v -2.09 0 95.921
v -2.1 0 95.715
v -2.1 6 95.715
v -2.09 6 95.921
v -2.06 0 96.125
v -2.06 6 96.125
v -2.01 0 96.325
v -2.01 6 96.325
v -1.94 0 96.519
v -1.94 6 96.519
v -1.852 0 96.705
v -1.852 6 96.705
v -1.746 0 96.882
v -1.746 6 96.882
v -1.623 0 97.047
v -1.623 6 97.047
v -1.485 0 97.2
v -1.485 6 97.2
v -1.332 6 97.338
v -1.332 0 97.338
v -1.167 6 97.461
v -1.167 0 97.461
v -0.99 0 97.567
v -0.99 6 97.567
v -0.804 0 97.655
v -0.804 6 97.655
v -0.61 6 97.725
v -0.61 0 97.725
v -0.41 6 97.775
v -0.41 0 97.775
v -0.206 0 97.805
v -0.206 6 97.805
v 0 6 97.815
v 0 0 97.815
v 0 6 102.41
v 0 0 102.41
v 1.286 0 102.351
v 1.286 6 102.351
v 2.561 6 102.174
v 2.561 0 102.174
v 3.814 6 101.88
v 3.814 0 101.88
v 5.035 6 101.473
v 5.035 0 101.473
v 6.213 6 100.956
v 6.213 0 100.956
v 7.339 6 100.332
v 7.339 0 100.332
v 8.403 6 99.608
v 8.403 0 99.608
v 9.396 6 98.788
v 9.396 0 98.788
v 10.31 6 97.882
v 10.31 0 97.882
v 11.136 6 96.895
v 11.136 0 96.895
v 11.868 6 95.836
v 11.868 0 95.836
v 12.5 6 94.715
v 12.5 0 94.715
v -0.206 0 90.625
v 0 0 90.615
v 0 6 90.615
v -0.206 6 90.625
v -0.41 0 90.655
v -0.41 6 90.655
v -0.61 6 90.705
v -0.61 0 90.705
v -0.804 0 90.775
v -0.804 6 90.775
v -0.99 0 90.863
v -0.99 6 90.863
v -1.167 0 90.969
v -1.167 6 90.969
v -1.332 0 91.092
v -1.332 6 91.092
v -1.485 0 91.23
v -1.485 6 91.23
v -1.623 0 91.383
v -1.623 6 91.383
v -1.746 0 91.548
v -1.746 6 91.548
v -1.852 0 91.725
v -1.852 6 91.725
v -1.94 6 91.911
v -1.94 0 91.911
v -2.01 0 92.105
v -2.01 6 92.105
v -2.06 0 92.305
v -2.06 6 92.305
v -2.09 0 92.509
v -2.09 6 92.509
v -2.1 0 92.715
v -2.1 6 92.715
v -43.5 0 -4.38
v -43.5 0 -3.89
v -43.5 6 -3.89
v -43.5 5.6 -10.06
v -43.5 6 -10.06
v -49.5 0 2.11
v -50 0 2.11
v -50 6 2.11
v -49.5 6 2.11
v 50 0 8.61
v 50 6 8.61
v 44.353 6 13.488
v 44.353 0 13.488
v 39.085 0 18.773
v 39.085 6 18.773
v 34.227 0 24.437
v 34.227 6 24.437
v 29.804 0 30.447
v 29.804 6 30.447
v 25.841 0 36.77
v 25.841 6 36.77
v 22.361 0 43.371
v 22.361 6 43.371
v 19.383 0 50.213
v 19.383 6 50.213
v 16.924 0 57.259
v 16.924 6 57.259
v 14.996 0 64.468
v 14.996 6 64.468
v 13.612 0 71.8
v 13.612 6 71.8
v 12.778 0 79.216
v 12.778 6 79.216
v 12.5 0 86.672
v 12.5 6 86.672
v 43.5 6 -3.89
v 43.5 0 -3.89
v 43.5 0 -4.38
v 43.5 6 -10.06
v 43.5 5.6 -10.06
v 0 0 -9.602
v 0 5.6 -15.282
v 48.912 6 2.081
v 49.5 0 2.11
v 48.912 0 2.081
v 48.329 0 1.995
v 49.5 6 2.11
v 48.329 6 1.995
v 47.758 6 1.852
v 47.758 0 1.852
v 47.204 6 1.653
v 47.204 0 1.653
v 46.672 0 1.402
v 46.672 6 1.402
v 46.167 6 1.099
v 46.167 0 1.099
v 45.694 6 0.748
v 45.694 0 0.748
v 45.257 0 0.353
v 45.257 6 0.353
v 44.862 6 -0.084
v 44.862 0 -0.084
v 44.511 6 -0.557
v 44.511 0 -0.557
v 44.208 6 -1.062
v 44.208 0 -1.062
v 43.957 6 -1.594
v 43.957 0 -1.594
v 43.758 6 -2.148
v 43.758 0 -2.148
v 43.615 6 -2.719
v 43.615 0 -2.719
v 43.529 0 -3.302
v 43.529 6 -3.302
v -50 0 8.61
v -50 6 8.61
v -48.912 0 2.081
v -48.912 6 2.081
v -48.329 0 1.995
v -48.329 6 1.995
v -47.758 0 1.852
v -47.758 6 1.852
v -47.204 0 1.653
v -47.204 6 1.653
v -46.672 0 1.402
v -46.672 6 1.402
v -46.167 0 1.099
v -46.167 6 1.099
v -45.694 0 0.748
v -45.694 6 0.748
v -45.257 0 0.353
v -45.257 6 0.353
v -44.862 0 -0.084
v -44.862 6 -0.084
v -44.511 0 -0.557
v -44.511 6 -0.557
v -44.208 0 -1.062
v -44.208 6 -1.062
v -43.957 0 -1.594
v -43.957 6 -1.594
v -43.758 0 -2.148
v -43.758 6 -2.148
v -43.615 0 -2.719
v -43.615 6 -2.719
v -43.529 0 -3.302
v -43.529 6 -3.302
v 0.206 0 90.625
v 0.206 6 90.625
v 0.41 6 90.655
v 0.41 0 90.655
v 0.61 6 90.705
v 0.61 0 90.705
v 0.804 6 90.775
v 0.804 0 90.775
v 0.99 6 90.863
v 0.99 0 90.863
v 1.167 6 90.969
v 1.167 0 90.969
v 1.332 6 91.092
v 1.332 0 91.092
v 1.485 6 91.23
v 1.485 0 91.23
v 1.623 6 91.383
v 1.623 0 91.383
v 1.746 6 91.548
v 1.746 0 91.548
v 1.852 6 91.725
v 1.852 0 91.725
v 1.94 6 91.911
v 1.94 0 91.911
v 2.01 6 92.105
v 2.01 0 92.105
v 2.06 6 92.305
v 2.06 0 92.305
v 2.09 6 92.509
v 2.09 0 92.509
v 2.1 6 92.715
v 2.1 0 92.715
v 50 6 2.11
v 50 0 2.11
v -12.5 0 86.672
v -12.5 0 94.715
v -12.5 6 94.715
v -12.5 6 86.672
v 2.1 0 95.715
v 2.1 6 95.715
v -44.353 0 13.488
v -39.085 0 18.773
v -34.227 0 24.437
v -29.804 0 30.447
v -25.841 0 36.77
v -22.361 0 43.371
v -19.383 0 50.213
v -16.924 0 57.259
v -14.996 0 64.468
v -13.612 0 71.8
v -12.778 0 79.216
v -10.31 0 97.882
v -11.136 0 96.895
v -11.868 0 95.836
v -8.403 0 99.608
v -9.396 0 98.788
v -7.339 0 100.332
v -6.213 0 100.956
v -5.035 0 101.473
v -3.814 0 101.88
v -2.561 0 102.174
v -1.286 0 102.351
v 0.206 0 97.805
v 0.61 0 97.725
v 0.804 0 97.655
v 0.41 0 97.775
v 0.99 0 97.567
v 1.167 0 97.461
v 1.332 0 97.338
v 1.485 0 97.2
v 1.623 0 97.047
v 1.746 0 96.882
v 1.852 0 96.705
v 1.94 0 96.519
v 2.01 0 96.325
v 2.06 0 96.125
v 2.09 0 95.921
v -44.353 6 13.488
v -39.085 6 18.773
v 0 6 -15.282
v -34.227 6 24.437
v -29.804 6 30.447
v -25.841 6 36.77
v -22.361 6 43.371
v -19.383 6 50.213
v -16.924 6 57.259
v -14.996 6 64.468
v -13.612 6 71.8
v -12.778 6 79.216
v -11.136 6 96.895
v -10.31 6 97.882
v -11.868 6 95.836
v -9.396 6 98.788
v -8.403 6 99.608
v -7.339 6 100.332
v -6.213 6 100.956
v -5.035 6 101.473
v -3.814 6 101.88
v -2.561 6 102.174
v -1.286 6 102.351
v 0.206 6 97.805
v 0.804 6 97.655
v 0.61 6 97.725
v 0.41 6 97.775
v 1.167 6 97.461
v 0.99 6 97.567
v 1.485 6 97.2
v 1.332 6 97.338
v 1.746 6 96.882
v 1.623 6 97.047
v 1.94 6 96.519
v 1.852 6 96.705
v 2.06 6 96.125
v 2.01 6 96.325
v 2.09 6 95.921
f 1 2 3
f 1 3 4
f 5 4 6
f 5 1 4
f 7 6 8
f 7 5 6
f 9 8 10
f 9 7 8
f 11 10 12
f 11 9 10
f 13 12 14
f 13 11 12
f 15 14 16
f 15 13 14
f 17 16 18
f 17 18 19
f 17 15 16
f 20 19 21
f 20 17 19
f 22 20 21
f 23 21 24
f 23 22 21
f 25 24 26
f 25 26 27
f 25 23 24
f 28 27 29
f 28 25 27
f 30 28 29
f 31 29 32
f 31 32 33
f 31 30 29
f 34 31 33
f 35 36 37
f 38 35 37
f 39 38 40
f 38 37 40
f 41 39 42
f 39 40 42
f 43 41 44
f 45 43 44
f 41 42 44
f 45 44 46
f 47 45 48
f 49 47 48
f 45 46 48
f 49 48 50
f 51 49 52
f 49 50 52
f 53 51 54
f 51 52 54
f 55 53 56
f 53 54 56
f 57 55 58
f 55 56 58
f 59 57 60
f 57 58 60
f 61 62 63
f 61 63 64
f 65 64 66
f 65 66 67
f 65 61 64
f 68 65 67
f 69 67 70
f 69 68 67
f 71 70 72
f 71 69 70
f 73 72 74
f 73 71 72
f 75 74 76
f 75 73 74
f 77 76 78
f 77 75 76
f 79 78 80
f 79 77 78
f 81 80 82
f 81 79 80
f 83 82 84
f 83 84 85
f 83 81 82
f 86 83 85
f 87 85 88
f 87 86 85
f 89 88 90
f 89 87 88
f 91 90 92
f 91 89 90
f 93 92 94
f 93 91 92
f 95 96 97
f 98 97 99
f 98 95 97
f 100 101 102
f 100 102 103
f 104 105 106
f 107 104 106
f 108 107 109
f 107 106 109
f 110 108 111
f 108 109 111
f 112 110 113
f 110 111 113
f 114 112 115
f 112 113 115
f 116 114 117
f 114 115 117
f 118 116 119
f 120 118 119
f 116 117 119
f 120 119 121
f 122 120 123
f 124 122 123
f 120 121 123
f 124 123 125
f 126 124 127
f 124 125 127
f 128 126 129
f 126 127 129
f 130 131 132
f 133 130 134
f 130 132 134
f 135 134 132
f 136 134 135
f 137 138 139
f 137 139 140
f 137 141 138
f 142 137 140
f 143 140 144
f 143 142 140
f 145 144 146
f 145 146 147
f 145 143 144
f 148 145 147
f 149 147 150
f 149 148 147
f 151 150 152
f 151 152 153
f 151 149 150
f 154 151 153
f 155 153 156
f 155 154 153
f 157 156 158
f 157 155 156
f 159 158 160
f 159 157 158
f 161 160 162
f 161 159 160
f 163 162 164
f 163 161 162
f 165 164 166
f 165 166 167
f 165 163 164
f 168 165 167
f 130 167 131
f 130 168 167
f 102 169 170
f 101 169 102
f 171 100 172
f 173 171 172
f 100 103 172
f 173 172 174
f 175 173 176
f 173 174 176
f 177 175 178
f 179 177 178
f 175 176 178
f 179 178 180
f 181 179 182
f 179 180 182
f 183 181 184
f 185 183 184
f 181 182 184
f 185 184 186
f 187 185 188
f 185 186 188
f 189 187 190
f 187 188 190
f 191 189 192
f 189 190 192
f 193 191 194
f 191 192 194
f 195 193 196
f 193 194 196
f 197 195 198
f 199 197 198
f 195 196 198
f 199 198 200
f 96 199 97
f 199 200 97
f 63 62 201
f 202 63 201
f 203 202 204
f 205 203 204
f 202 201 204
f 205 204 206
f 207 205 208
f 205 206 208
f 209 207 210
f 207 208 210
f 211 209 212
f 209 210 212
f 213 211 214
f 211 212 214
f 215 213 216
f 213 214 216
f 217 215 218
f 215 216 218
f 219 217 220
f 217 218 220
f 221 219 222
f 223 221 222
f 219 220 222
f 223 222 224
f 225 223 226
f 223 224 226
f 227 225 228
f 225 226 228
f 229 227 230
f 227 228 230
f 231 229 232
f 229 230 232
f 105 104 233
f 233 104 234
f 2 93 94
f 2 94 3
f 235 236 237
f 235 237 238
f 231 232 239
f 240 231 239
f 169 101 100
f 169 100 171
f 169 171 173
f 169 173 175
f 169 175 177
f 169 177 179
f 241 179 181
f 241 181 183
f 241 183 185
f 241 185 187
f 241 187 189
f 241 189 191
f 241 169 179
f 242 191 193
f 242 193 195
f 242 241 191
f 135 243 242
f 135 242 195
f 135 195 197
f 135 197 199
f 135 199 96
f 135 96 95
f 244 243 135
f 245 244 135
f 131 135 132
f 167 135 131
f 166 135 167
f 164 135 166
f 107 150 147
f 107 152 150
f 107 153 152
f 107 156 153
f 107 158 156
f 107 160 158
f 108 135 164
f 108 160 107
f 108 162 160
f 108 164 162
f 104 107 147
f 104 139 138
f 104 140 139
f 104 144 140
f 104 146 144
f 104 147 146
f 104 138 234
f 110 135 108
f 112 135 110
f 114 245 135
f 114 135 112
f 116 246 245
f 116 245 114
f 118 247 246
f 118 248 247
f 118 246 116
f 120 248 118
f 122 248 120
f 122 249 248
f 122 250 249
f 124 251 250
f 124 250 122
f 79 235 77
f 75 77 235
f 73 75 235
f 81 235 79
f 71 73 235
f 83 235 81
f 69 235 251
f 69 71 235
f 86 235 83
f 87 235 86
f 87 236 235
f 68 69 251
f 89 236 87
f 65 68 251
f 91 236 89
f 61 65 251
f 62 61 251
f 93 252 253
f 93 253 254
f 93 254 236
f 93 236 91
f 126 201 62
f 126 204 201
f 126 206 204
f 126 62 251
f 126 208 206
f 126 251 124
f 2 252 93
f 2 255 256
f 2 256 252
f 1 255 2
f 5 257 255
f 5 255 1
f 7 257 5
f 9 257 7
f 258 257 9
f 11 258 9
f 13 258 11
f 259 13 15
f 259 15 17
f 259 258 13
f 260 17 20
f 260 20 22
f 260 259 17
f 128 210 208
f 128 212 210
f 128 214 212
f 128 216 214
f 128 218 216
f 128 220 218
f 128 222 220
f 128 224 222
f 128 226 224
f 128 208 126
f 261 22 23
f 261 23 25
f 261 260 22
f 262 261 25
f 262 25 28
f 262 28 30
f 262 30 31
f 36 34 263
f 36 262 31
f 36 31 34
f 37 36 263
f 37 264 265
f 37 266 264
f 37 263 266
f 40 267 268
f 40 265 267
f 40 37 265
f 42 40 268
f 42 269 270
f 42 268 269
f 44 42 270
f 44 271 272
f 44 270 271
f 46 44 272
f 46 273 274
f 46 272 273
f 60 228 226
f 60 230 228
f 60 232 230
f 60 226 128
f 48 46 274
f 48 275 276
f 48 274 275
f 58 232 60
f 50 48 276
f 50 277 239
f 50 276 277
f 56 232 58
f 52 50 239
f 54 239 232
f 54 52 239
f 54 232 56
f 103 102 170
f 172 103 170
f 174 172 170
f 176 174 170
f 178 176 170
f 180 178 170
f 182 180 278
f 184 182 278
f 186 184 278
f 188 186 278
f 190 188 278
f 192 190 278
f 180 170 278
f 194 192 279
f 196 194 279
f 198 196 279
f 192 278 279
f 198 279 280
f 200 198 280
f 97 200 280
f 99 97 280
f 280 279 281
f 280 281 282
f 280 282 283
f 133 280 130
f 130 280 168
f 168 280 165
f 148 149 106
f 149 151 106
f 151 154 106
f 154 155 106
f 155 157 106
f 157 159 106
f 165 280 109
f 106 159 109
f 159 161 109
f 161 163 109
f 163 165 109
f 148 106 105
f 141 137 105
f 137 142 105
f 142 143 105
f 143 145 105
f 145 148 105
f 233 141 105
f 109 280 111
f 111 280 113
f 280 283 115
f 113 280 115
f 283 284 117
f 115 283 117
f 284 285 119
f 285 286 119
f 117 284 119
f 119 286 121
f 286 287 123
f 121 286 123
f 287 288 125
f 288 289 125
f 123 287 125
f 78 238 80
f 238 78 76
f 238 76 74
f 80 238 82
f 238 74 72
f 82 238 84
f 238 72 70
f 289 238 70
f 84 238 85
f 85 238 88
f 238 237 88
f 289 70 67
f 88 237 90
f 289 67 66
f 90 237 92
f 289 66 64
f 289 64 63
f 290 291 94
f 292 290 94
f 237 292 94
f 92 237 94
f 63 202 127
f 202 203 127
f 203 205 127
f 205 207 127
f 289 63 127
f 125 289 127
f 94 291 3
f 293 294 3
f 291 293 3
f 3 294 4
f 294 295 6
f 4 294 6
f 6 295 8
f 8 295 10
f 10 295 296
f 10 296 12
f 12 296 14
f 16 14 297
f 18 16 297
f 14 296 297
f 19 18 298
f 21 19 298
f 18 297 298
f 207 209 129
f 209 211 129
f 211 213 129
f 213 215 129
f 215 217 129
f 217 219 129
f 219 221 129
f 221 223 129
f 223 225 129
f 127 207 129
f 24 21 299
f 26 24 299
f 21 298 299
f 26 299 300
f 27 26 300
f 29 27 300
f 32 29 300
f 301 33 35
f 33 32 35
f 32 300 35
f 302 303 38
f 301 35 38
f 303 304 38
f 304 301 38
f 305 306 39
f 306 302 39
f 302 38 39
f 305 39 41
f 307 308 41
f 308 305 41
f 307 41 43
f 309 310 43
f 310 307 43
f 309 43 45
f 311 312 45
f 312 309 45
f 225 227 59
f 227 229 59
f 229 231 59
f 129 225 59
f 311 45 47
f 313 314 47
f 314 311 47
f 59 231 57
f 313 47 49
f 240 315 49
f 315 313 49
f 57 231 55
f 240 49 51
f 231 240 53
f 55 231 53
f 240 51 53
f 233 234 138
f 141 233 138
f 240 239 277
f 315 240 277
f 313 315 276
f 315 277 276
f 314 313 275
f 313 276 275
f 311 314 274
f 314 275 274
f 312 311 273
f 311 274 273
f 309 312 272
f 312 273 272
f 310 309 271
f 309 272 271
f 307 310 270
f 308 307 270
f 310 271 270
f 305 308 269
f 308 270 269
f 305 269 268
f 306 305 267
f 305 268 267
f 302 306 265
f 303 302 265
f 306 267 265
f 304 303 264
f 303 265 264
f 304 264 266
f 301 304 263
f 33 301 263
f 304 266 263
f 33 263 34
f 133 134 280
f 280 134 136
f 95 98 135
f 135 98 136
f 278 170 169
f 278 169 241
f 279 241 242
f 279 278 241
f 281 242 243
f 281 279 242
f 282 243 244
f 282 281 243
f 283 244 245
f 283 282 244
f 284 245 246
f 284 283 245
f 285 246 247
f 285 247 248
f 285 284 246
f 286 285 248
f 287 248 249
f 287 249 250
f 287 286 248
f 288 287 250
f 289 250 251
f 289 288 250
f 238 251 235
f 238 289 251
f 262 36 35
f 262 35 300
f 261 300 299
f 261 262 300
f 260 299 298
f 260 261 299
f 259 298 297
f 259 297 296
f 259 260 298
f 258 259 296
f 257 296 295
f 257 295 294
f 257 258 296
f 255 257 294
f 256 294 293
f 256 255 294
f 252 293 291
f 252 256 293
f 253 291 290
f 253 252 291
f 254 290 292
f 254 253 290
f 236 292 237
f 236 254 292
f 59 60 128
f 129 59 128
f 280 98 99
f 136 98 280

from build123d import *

# Parameters (mm, degrees)
F1_DEPTH    = 6
F2_R        = 6
F3_SIZE2    = 5.6
F3_SIZE     = 5.64
F4_T1_DEPTH = 6


# Not quite as in the source:
# - a fillet or chamfer that OpenCascade refuses, or shapes differently, is made with other operations: its cross-section is extruded or revolved along the edge and cut away or added


with BuildPart() as f1:
    # F0 (on Front) → F1 (new body)
    with BuildSketch(Plane.XZ):
        with BuildLine():
            Line((-43.5, -10.06), (0, -15.282))
            Line((0, -15.282), (0, 74.41))
            ThreePointArc((0, 74.41), (-7.3393922947, 76.4880320104), (-12.5, 82.1052398935))
            Line((-12.5, 82.1052398935), (-12.5, 8.61))
            Line((-12.5, 8.61), (-50, 8.61))
            Line((-50, 8.61), (-50, 2.11))
            Line((-50, 2.11), (-43.5, 2.11))
            Line((-43.5, 2.11), (-43.5, -10.06))
        make_face()
        with BuildLine():
            ThreePointArc((-12.5, 82.1052398935), (-7.3393922947, 76.4880320104), (0, 74.41))
            Line((0, 74.41), (0, 90.615))
            ThreePointArc((0, 90.615), (-1.4849242405, 91.2300757595), (-2.1, 92.715))
            Line((-2.1, 92.715), (-2.1, 95.715))
            ThreePointArc((-2.1, 95.715), (-1.4849242405, 97.1999242405), (0, 97.815))
            Line((0, 97.815), (0, 102.41))
            ThreePointArc((0, 102.41), (-7.3393922947, 100.3319679896), (-12.5, 94.7147601065))
            Line((-12.5, 94.7147601065), (-12.5, 82.1052398935))
        make_face()
    extrude(amount=-F1_DEPTH)

    # F2
    f2_edges = [f1.edges().sort_by_distance(p)[0] for p in [
        (-43.5, 3, 2.11),
    ]]
    fillet(f2_edges, radius=F2_R)

    # F3
    f3_edges = [f1.edges().sort_by_distance(p)[0] for p in [
        (-21.75, 0, -12.671),
    ]]
    f3_side = f1.faces().sort_by_distance((-42.221274, 0, -6.975))[0]
    chamfer(f3_edges, length=F3_SIZE, length2=F3_SIZE2, reference=f3_side)

    # F4: fillet of radius 100 on 1 edges, made by hand

    # F4_s2 → F4_t1 (join)
    with BuildSketch(Plane.XZ.offset(-6)):
        with BuildLine():
            ThreePointArc((-50, 8.61), (-22.3612181134, 43.3712047908), (-12.5, 86.67247498))
            Line((-12.5, 86.67247498), (-12.5, 8.61))
            Line((-12.5, 8.61), (-50, 8.61))
        make_face()
    extrude(amount=F4_T1_DEPTH)

    # F5: F1 across plane


with BuildPart() as f1_1:
    add(f1.part)
    add(f1.part.mirror(Plane.YZ))


solid = f1_1.part
